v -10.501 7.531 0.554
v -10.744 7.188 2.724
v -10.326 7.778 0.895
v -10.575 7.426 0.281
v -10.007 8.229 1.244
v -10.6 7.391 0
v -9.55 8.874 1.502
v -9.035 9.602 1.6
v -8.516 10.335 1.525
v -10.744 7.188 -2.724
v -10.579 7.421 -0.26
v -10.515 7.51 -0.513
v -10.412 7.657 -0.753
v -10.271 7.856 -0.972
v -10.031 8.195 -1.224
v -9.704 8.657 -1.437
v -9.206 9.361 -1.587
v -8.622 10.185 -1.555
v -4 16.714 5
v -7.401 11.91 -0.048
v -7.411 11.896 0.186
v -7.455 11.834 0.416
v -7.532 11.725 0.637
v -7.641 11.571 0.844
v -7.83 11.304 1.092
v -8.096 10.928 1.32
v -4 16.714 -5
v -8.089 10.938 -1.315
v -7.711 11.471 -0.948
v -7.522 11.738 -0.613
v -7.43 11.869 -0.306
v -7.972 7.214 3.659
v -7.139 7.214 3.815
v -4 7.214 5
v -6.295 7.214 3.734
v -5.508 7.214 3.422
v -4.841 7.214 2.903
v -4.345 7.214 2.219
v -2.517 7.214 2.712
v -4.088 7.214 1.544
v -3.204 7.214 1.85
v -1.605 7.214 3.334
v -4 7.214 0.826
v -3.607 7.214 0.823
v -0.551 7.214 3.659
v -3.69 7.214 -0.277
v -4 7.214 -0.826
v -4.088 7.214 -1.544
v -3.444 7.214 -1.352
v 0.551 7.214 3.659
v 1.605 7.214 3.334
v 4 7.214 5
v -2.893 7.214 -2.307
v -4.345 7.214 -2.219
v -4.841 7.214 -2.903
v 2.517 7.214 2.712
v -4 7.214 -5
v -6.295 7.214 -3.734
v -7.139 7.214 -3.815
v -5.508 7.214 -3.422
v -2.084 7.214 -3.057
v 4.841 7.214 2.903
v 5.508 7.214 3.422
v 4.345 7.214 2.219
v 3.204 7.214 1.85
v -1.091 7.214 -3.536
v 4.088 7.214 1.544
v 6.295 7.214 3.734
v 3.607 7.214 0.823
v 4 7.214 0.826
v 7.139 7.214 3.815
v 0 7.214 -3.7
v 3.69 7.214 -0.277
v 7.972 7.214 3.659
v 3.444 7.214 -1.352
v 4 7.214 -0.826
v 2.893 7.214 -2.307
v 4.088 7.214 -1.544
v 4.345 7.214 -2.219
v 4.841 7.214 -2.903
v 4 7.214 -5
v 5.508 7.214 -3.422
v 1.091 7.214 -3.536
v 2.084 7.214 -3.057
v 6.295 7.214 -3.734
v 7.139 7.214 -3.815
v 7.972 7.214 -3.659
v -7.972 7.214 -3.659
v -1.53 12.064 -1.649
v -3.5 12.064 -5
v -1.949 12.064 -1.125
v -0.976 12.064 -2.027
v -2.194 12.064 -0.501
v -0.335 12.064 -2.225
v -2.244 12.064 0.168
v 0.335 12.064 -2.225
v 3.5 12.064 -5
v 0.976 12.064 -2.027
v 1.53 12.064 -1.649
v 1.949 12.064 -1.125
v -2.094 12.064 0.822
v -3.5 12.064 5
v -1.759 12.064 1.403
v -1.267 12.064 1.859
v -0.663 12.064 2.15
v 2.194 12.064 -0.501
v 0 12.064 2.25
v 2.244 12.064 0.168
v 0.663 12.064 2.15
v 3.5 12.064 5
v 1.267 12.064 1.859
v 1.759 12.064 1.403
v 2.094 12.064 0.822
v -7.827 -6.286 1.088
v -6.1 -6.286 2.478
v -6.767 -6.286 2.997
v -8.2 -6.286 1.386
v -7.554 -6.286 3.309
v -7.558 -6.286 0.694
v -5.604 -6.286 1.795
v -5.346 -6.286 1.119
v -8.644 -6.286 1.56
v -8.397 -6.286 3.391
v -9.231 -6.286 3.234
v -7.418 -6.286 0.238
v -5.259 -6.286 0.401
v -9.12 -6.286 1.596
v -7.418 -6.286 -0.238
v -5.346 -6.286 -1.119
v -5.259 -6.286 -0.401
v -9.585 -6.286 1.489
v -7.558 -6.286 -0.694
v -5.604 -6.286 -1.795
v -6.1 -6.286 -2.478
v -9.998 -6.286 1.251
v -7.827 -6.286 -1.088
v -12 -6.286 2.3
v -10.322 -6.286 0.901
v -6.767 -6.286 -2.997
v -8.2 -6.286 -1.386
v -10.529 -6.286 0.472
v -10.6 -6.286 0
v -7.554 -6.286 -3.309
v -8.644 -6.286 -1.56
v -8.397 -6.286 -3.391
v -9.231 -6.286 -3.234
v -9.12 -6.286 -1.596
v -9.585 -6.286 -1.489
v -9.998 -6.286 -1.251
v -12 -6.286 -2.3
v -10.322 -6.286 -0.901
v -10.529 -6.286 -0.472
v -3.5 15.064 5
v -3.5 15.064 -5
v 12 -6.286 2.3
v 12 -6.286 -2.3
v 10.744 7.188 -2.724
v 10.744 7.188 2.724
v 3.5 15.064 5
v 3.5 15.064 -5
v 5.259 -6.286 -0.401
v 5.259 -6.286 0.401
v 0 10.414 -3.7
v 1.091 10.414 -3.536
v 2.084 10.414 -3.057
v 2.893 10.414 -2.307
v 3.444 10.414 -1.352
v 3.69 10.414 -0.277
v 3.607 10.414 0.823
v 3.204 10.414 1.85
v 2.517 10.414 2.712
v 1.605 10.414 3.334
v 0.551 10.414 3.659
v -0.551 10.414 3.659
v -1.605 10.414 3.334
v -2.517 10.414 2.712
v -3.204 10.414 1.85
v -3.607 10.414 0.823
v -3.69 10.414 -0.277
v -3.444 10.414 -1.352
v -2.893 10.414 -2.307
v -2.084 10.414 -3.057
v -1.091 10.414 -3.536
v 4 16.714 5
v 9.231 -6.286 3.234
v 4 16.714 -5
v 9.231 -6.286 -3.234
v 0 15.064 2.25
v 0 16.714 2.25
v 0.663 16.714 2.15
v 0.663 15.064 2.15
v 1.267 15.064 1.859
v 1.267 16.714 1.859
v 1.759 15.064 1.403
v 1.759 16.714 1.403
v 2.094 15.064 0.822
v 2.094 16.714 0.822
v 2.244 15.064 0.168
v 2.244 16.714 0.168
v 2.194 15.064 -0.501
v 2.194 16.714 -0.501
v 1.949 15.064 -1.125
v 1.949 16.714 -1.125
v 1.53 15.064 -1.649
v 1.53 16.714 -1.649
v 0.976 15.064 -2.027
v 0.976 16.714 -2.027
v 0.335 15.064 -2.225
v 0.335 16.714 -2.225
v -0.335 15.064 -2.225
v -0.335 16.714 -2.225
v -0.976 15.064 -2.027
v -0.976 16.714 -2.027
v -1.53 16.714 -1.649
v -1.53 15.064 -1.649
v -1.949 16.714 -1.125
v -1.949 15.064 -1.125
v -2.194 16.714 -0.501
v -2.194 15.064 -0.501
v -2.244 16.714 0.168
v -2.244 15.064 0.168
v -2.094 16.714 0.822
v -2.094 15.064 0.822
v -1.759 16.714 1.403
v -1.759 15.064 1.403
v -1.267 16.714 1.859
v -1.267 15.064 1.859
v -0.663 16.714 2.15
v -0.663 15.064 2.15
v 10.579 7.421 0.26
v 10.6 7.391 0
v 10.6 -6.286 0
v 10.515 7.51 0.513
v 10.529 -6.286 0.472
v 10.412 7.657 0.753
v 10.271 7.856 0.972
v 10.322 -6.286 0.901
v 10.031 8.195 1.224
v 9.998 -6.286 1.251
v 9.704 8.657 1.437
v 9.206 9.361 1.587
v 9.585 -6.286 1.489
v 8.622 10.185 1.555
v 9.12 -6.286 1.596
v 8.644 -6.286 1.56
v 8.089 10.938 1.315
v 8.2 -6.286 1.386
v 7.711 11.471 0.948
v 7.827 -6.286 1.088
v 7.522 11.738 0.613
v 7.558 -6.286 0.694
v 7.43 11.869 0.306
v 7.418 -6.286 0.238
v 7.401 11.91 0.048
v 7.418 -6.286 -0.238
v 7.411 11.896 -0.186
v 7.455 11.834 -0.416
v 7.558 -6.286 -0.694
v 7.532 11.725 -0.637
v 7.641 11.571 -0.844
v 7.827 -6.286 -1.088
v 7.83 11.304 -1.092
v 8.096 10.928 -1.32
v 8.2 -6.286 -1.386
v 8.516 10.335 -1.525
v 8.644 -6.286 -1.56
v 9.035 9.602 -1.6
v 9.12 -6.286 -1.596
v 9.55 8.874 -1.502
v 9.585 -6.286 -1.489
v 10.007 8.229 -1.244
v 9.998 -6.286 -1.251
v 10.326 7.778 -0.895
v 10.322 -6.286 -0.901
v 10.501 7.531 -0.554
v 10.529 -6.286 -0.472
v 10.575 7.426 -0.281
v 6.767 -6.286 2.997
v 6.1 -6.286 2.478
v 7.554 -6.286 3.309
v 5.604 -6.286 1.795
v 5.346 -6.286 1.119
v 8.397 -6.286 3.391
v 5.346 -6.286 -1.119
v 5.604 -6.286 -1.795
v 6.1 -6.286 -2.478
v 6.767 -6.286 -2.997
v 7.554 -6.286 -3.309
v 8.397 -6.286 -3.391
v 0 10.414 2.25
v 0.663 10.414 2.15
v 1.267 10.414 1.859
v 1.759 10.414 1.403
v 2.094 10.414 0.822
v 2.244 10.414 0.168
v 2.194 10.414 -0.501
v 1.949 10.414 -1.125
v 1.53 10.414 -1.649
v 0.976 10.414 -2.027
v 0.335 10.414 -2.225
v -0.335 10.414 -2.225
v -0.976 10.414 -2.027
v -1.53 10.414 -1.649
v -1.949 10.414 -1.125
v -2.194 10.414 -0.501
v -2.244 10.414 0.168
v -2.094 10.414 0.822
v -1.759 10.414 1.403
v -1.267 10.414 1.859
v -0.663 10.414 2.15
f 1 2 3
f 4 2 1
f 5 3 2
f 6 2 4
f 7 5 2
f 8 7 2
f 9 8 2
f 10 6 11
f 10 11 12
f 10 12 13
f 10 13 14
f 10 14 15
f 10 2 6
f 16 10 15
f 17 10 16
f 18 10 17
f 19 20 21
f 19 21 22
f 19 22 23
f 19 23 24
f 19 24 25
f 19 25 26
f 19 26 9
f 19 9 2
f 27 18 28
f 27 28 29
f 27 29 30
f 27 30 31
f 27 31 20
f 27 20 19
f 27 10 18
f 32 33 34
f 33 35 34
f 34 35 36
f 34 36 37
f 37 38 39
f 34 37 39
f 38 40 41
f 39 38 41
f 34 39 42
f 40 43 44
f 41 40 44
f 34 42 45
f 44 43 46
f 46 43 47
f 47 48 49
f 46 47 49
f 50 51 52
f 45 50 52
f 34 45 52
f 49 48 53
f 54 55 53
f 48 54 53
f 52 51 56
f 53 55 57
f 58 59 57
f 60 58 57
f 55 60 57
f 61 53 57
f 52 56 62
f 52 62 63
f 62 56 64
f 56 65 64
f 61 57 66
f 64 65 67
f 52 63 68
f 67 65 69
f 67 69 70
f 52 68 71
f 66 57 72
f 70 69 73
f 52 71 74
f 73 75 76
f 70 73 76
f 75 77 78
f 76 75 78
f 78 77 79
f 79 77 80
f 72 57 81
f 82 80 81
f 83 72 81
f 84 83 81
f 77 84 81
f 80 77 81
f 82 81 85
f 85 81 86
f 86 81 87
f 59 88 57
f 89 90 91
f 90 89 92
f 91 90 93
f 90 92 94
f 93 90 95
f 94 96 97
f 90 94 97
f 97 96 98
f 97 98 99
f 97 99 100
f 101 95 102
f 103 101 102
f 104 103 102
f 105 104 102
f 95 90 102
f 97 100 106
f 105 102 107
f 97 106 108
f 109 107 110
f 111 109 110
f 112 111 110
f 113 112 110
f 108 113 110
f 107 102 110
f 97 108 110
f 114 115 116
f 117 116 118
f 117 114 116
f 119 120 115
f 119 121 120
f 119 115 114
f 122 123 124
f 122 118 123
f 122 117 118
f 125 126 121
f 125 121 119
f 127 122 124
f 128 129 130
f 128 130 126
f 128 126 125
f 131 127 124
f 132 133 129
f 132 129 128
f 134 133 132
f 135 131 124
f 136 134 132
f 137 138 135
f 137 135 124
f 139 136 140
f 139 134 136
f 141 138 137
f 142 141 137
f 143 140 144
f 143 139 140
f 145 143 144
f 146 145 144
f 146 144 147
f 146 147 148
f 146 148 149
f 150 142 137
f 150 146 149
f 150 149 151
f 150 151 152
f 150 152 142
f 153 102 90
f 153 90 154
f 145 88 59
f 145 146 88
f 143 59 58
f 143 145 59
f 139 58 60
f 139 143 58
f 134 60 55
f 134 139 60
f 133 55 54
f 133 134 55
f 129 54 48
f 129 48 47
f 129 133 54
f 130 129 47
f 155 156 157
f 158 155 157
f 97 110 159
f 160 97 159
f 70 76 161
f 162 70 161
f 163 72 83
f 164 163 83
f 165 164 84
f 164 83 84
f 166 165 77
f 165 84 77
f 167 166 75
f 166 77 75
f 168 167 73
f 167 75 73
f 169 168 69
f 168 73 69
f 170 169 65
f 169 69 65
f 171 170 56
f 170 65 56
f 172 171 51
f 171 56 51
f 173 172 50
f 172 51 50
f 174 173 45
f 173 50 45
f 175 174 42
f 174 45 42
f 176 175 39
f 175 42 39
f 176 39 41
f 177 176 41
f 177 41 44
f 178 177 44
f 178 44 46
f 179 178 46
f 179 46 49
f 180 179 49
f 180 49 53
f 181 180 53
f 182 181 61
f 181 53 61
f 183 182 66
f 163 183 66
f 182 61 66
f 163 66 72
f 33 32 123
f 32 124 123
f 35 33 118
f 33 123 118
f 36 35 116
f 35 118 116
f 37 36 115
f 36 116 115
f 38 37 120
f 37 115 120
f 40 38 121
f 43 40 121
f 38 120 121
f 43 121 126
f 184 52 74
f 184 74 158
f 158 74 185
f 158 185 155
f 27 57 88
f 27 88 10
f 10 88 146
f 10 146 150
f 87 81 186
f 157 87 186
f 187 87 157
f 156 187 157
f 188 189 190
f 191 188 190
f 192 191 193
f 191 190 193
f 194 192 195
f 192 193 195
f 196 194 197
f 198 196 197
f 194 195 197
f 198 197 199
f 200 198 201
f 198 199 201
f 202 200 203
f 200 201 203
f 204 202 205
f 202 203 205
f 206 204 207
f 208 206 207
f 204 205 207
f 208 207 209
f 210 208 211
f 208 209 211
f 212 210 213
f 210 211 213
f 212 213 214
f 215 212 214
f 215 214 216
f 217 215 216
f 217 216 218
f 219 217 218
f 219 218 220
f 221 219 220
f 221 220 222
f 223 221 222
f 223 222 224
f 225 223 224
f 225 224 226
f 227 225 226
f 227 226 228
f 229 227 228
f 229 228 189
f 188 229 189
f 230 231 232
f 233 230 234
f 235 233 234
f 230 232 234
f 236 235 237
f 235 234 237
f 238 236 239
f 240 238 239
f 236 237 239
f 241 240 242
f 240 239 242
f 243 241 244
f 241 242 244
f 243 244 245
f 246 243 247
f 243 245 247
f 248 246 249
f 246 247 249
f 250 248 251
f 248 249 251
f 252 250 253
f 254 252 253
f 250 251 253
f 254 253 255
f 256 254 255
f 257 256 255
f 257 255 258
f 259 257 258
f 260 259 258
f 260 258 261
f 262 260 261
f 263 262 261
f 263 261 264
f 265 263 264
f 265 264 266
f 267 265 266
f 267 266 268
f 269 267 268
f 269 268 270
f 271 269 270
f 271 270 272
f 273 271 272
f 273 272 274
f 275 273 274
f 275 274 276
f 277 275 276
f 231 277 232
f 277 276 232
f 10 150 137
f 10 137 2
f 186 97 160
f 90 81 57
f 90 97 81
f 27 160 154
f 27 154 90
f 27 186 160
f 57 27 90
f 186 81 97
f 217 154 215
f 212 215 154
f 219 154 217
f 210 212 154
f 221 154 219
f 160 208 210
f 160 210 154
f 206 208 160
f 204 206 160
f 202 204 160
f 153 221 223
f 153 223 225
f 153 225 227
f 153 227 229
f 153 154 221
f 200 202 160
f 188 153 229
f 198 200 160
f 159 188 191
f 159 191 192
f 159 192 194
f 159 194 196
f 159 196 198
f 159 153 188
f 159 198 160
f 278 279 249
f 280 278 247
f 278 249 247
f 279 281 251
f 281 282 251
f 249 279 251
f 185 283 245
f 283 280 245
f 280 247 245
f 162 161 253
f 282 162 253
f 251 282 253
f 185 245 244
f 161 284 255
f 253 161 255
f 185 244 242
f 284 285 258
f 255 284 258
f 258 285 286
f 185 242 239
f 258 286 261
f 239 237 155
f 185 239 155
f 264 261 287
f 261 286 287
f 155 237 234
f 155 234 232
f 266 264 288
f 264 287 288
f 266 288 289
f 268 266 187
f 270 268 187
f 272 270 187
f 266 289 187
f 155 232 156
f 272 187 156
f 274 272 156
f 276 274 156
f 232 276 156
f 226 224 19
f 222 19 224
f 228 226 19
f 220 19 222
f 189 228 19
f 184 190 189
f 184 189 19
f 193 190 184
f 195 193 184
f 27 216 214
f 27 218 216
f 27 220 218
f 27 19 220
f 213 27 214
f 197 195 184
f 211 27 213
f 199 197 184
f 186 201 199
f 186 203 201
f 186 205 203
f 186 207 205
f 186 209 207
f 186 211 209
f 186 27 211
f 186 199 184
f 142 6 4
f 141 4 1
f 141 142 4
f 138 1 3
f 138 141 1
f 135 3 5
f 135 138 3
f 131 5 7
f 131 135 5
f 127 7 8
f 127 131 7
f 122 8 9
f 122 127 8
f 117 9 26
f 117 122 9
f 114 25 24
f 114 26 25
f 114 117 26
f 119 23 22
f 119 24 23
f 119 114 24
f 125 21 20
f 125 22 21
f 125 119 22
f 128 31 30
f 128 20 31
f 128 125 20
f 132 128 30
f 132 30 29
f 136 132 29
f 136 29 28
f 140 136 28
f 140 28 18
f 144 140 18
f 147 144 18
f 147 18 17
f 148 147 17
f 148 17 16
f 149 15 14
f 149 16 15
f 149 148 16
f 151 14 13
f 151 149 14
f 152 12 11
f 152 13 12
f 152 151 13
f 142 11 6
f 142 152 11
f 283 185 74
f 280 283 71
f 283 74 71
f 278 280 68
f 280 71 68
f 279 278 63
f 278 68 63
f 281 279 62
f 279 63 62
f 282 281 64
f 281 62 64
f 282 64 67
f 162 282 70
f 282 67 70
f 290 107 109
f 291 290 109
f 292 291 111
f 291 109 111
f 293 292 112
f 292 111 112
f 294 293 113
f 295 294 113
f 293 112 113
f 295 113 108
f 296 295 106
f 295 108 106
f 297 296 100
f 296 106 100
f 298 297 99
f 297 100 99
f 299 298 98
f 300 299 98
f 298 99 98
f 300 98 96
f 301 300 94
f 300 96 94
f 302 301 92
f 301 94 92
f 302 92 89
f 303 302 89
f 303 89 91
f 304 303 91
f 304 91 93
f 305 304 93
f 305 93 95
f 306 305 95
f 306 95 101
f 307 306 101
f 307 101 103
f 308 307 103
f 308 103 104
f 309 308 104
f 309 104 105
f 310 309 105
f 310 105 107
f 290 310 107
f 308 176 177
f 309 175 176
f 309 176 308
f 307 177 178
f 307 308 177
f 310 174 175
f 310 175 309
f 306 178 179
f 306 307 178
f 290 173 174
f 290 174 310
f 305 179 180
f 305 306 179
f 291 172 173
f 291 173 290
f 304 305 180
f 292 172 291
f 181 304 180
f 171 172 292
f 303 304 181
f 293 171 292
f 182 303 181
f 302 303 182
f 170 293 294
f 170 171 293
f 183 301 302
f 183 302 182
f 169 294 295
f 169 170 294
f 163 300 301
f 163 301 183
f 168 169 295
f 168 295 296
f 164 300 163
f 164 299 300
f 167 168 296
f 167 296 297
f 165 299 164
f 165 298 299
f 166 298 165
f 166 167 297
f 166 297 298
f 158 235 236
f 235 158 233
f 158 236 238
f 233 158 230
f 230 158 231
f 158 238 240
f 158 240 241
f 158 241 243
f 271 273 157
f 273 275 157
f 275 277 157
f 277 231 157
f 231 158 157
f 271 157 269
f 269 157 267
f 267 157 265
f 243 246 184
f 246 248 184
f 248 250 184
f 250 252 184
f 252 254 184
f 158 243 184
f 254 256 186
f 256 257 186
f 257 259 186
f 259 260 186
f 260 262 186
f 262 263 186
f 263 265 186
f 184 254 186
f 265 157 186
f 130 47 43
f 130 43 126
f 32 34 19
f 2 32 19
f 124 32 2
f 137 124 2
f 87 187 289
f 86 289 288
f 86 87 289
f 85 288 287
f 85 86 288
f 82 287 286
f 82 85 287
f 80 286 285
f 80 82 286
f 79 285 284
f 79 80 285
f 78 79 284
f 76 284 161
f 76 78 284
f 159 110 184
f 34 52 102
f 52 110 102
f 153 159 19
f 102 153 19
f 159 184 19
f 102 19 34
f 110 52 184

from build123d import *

# Parameters (mm, degrees)
JOINT_BODY_DEPTH      = 5
JOINT_BODY_DEPTH_BACK = 5
ESQUISSE1_W           = 8
ESQUISSE1_H           = 6.5
ESQUISSE2_R           = 3.7
BEARINGHOLE_DEPTH     = 3.2
ESQUISSE4_W           = 8
ESQUISSE4_H           = 10
LOCKEREXTRUDE_DEPTH   = 3
ESQUISSE5_R           = 2.25
AXEHOLE_DEPTH         = 16
ESQUISSE6_W           = 7
ESQUISSE6_H           = 3
LOCKERHOLE_DEPTH      = 16
FIXATIONEXTRUDE_START = -5
FIXATIONEXTRUDE_DEPTH = 10
ESQUISSE8_R           = 1.6
FIXATIONHOLE_DEPTH    = 19.5
FIXATIONPROFILE_DEPTH = 27.419689627
CONG_1_R              = 3


with BuildPart() as part:
    # Esquisse1 → Joint body (new, two sides: drawn at the far end of the back side and taken through both)
    with BuildSketch(Plane.XY.offset(-JOINT_BODY_DEPTH_BACK)):
        with Locations((0, 10.463867403)):
            Rectangle(ESQUISSE1_W, ESQUISSE1_H)
    extrude(amount=JOINT_BODY_DEPTH + JOINT_BODY_DEPTH_BACK)

    # Esquisse2 → BearingHole (cut)
    with BuildSketch(Plane.XZ.offset(-7.213867403)):
        with Locations(Location((0, 0, 0), (0, 0, 270))):
            Circle(ESQUISSE2_R)
    extrude(amount=-BEARINGHOLE_DEPTH, mode=Mode.SUBTRACT)

    # Esquisse4 → LockerExtrude (add)
    with BuildSketch(Plane(origin=(0, 13.713867403, 0), x_dir=(1, 0, 0), z_dir=(0, 1, 0))):
        Rectangle(ESQUISSE4_W, ESQUISSE4_H)
    extrude(amount=LOCKEREXTRUDE_DEPTH)

    # Esquisse5 → AxeHole (cut)
    with BuildSketch(Plane(origin=(0, 16.713867403, 0), x_dir=(1, 0, 0), z_dir=(0, 1, 0))):
        with Locations(Location((0, 0, 0), (0, 0, 270))):
            Circle(ESQUISSE5_R)
    extrude(amount=-AXEHOLE_DEPTH, mode=Mode.SUBTRACT)

    # Esquisse6 → LockerHole (cut)
    with BuildSketch(Plane.XY.offset(5)):
        with Locations((0, 13.563867403)):
            Rectangle(ESQUISSE6_W, ESQUISSE6_H)
    extrude(amount=-LOCKERHOLE_DEPTH, mode=Mode.SUBTRACT)

    # Esquisse7 → FixationExtrude (add)
    with BuildSketch(Plane.XY.offset(FIXATIONEXTRUDE_START)):
        Polygon((12, -6.286132597), (10.743640135, 7.188023114), (4, 16.713867403), (4, 7.213867403), (5.258769643, -6.286132597), align=None)
    fixationextrude = extrude(amount=FIXATIONEXTRUDE_DEPTH)

    # Esquisse8 → FixationHole (cut)
    with BuildSketch(Plane.XZ.offset(6.286132597)):
        with Locations((9, 0)):
            Circle(ESQUISSE8_R)
    fixationhole = extrude(amount=-FIXATIONHOLE_DEPTH, mode=Mode.SUBTRACT)

    # Esquisse10 → FixationProfile (cut, through all)
    with BuildSketch(Plane.XZ.offset(6.286132597)):
        Polygon((12, 2.3), (12, 5), (4, 5), align=None)
        Polygon((12, -2.3), (12, -5), (4, -5), align=None)
    fixationprofile = extrude(amount=-FIXATIONPROFILE_DEPTH, mode=Mode.SUBTRACT)

    # Symétrie3: FixationExtrude, FixationHole, FixationProfile across plane
    add(fixationextrude.mirror(Plane(origin=(0, 0, 0), x_dir=(0, 0, 1), z_dir=(1, 0, 0))))
    add(fixationhole.mirror(Plane(origin=(0, 0, 0), x_dir=(0, 0, 1), z_dir=(1, 0, 0))), mode=Mode.SUBTRACT)
    add(fixationprofile.mirror(Plane(origin=(0, 0, 0), x_dir=(0, 0, 1), z_dir=(1, 0, 0))), mode=Mode.SUBTRACT)

    # Congé1
    cong_1_edges = [part.edges().sort_by_distance(p)[0] for p in [
        (-4.629384821, 0.463867403, -4.787582623),
        (-4.629384821, 0.463867403, 4.787582623),
        (4.629384821, 0.463867403, 4.787582623),
        (4.629384821, 0.463867403, -4.787582623),
    ]]
    fillet(cong_1_edges, radius=CONG_1_R)


solid = part.part
